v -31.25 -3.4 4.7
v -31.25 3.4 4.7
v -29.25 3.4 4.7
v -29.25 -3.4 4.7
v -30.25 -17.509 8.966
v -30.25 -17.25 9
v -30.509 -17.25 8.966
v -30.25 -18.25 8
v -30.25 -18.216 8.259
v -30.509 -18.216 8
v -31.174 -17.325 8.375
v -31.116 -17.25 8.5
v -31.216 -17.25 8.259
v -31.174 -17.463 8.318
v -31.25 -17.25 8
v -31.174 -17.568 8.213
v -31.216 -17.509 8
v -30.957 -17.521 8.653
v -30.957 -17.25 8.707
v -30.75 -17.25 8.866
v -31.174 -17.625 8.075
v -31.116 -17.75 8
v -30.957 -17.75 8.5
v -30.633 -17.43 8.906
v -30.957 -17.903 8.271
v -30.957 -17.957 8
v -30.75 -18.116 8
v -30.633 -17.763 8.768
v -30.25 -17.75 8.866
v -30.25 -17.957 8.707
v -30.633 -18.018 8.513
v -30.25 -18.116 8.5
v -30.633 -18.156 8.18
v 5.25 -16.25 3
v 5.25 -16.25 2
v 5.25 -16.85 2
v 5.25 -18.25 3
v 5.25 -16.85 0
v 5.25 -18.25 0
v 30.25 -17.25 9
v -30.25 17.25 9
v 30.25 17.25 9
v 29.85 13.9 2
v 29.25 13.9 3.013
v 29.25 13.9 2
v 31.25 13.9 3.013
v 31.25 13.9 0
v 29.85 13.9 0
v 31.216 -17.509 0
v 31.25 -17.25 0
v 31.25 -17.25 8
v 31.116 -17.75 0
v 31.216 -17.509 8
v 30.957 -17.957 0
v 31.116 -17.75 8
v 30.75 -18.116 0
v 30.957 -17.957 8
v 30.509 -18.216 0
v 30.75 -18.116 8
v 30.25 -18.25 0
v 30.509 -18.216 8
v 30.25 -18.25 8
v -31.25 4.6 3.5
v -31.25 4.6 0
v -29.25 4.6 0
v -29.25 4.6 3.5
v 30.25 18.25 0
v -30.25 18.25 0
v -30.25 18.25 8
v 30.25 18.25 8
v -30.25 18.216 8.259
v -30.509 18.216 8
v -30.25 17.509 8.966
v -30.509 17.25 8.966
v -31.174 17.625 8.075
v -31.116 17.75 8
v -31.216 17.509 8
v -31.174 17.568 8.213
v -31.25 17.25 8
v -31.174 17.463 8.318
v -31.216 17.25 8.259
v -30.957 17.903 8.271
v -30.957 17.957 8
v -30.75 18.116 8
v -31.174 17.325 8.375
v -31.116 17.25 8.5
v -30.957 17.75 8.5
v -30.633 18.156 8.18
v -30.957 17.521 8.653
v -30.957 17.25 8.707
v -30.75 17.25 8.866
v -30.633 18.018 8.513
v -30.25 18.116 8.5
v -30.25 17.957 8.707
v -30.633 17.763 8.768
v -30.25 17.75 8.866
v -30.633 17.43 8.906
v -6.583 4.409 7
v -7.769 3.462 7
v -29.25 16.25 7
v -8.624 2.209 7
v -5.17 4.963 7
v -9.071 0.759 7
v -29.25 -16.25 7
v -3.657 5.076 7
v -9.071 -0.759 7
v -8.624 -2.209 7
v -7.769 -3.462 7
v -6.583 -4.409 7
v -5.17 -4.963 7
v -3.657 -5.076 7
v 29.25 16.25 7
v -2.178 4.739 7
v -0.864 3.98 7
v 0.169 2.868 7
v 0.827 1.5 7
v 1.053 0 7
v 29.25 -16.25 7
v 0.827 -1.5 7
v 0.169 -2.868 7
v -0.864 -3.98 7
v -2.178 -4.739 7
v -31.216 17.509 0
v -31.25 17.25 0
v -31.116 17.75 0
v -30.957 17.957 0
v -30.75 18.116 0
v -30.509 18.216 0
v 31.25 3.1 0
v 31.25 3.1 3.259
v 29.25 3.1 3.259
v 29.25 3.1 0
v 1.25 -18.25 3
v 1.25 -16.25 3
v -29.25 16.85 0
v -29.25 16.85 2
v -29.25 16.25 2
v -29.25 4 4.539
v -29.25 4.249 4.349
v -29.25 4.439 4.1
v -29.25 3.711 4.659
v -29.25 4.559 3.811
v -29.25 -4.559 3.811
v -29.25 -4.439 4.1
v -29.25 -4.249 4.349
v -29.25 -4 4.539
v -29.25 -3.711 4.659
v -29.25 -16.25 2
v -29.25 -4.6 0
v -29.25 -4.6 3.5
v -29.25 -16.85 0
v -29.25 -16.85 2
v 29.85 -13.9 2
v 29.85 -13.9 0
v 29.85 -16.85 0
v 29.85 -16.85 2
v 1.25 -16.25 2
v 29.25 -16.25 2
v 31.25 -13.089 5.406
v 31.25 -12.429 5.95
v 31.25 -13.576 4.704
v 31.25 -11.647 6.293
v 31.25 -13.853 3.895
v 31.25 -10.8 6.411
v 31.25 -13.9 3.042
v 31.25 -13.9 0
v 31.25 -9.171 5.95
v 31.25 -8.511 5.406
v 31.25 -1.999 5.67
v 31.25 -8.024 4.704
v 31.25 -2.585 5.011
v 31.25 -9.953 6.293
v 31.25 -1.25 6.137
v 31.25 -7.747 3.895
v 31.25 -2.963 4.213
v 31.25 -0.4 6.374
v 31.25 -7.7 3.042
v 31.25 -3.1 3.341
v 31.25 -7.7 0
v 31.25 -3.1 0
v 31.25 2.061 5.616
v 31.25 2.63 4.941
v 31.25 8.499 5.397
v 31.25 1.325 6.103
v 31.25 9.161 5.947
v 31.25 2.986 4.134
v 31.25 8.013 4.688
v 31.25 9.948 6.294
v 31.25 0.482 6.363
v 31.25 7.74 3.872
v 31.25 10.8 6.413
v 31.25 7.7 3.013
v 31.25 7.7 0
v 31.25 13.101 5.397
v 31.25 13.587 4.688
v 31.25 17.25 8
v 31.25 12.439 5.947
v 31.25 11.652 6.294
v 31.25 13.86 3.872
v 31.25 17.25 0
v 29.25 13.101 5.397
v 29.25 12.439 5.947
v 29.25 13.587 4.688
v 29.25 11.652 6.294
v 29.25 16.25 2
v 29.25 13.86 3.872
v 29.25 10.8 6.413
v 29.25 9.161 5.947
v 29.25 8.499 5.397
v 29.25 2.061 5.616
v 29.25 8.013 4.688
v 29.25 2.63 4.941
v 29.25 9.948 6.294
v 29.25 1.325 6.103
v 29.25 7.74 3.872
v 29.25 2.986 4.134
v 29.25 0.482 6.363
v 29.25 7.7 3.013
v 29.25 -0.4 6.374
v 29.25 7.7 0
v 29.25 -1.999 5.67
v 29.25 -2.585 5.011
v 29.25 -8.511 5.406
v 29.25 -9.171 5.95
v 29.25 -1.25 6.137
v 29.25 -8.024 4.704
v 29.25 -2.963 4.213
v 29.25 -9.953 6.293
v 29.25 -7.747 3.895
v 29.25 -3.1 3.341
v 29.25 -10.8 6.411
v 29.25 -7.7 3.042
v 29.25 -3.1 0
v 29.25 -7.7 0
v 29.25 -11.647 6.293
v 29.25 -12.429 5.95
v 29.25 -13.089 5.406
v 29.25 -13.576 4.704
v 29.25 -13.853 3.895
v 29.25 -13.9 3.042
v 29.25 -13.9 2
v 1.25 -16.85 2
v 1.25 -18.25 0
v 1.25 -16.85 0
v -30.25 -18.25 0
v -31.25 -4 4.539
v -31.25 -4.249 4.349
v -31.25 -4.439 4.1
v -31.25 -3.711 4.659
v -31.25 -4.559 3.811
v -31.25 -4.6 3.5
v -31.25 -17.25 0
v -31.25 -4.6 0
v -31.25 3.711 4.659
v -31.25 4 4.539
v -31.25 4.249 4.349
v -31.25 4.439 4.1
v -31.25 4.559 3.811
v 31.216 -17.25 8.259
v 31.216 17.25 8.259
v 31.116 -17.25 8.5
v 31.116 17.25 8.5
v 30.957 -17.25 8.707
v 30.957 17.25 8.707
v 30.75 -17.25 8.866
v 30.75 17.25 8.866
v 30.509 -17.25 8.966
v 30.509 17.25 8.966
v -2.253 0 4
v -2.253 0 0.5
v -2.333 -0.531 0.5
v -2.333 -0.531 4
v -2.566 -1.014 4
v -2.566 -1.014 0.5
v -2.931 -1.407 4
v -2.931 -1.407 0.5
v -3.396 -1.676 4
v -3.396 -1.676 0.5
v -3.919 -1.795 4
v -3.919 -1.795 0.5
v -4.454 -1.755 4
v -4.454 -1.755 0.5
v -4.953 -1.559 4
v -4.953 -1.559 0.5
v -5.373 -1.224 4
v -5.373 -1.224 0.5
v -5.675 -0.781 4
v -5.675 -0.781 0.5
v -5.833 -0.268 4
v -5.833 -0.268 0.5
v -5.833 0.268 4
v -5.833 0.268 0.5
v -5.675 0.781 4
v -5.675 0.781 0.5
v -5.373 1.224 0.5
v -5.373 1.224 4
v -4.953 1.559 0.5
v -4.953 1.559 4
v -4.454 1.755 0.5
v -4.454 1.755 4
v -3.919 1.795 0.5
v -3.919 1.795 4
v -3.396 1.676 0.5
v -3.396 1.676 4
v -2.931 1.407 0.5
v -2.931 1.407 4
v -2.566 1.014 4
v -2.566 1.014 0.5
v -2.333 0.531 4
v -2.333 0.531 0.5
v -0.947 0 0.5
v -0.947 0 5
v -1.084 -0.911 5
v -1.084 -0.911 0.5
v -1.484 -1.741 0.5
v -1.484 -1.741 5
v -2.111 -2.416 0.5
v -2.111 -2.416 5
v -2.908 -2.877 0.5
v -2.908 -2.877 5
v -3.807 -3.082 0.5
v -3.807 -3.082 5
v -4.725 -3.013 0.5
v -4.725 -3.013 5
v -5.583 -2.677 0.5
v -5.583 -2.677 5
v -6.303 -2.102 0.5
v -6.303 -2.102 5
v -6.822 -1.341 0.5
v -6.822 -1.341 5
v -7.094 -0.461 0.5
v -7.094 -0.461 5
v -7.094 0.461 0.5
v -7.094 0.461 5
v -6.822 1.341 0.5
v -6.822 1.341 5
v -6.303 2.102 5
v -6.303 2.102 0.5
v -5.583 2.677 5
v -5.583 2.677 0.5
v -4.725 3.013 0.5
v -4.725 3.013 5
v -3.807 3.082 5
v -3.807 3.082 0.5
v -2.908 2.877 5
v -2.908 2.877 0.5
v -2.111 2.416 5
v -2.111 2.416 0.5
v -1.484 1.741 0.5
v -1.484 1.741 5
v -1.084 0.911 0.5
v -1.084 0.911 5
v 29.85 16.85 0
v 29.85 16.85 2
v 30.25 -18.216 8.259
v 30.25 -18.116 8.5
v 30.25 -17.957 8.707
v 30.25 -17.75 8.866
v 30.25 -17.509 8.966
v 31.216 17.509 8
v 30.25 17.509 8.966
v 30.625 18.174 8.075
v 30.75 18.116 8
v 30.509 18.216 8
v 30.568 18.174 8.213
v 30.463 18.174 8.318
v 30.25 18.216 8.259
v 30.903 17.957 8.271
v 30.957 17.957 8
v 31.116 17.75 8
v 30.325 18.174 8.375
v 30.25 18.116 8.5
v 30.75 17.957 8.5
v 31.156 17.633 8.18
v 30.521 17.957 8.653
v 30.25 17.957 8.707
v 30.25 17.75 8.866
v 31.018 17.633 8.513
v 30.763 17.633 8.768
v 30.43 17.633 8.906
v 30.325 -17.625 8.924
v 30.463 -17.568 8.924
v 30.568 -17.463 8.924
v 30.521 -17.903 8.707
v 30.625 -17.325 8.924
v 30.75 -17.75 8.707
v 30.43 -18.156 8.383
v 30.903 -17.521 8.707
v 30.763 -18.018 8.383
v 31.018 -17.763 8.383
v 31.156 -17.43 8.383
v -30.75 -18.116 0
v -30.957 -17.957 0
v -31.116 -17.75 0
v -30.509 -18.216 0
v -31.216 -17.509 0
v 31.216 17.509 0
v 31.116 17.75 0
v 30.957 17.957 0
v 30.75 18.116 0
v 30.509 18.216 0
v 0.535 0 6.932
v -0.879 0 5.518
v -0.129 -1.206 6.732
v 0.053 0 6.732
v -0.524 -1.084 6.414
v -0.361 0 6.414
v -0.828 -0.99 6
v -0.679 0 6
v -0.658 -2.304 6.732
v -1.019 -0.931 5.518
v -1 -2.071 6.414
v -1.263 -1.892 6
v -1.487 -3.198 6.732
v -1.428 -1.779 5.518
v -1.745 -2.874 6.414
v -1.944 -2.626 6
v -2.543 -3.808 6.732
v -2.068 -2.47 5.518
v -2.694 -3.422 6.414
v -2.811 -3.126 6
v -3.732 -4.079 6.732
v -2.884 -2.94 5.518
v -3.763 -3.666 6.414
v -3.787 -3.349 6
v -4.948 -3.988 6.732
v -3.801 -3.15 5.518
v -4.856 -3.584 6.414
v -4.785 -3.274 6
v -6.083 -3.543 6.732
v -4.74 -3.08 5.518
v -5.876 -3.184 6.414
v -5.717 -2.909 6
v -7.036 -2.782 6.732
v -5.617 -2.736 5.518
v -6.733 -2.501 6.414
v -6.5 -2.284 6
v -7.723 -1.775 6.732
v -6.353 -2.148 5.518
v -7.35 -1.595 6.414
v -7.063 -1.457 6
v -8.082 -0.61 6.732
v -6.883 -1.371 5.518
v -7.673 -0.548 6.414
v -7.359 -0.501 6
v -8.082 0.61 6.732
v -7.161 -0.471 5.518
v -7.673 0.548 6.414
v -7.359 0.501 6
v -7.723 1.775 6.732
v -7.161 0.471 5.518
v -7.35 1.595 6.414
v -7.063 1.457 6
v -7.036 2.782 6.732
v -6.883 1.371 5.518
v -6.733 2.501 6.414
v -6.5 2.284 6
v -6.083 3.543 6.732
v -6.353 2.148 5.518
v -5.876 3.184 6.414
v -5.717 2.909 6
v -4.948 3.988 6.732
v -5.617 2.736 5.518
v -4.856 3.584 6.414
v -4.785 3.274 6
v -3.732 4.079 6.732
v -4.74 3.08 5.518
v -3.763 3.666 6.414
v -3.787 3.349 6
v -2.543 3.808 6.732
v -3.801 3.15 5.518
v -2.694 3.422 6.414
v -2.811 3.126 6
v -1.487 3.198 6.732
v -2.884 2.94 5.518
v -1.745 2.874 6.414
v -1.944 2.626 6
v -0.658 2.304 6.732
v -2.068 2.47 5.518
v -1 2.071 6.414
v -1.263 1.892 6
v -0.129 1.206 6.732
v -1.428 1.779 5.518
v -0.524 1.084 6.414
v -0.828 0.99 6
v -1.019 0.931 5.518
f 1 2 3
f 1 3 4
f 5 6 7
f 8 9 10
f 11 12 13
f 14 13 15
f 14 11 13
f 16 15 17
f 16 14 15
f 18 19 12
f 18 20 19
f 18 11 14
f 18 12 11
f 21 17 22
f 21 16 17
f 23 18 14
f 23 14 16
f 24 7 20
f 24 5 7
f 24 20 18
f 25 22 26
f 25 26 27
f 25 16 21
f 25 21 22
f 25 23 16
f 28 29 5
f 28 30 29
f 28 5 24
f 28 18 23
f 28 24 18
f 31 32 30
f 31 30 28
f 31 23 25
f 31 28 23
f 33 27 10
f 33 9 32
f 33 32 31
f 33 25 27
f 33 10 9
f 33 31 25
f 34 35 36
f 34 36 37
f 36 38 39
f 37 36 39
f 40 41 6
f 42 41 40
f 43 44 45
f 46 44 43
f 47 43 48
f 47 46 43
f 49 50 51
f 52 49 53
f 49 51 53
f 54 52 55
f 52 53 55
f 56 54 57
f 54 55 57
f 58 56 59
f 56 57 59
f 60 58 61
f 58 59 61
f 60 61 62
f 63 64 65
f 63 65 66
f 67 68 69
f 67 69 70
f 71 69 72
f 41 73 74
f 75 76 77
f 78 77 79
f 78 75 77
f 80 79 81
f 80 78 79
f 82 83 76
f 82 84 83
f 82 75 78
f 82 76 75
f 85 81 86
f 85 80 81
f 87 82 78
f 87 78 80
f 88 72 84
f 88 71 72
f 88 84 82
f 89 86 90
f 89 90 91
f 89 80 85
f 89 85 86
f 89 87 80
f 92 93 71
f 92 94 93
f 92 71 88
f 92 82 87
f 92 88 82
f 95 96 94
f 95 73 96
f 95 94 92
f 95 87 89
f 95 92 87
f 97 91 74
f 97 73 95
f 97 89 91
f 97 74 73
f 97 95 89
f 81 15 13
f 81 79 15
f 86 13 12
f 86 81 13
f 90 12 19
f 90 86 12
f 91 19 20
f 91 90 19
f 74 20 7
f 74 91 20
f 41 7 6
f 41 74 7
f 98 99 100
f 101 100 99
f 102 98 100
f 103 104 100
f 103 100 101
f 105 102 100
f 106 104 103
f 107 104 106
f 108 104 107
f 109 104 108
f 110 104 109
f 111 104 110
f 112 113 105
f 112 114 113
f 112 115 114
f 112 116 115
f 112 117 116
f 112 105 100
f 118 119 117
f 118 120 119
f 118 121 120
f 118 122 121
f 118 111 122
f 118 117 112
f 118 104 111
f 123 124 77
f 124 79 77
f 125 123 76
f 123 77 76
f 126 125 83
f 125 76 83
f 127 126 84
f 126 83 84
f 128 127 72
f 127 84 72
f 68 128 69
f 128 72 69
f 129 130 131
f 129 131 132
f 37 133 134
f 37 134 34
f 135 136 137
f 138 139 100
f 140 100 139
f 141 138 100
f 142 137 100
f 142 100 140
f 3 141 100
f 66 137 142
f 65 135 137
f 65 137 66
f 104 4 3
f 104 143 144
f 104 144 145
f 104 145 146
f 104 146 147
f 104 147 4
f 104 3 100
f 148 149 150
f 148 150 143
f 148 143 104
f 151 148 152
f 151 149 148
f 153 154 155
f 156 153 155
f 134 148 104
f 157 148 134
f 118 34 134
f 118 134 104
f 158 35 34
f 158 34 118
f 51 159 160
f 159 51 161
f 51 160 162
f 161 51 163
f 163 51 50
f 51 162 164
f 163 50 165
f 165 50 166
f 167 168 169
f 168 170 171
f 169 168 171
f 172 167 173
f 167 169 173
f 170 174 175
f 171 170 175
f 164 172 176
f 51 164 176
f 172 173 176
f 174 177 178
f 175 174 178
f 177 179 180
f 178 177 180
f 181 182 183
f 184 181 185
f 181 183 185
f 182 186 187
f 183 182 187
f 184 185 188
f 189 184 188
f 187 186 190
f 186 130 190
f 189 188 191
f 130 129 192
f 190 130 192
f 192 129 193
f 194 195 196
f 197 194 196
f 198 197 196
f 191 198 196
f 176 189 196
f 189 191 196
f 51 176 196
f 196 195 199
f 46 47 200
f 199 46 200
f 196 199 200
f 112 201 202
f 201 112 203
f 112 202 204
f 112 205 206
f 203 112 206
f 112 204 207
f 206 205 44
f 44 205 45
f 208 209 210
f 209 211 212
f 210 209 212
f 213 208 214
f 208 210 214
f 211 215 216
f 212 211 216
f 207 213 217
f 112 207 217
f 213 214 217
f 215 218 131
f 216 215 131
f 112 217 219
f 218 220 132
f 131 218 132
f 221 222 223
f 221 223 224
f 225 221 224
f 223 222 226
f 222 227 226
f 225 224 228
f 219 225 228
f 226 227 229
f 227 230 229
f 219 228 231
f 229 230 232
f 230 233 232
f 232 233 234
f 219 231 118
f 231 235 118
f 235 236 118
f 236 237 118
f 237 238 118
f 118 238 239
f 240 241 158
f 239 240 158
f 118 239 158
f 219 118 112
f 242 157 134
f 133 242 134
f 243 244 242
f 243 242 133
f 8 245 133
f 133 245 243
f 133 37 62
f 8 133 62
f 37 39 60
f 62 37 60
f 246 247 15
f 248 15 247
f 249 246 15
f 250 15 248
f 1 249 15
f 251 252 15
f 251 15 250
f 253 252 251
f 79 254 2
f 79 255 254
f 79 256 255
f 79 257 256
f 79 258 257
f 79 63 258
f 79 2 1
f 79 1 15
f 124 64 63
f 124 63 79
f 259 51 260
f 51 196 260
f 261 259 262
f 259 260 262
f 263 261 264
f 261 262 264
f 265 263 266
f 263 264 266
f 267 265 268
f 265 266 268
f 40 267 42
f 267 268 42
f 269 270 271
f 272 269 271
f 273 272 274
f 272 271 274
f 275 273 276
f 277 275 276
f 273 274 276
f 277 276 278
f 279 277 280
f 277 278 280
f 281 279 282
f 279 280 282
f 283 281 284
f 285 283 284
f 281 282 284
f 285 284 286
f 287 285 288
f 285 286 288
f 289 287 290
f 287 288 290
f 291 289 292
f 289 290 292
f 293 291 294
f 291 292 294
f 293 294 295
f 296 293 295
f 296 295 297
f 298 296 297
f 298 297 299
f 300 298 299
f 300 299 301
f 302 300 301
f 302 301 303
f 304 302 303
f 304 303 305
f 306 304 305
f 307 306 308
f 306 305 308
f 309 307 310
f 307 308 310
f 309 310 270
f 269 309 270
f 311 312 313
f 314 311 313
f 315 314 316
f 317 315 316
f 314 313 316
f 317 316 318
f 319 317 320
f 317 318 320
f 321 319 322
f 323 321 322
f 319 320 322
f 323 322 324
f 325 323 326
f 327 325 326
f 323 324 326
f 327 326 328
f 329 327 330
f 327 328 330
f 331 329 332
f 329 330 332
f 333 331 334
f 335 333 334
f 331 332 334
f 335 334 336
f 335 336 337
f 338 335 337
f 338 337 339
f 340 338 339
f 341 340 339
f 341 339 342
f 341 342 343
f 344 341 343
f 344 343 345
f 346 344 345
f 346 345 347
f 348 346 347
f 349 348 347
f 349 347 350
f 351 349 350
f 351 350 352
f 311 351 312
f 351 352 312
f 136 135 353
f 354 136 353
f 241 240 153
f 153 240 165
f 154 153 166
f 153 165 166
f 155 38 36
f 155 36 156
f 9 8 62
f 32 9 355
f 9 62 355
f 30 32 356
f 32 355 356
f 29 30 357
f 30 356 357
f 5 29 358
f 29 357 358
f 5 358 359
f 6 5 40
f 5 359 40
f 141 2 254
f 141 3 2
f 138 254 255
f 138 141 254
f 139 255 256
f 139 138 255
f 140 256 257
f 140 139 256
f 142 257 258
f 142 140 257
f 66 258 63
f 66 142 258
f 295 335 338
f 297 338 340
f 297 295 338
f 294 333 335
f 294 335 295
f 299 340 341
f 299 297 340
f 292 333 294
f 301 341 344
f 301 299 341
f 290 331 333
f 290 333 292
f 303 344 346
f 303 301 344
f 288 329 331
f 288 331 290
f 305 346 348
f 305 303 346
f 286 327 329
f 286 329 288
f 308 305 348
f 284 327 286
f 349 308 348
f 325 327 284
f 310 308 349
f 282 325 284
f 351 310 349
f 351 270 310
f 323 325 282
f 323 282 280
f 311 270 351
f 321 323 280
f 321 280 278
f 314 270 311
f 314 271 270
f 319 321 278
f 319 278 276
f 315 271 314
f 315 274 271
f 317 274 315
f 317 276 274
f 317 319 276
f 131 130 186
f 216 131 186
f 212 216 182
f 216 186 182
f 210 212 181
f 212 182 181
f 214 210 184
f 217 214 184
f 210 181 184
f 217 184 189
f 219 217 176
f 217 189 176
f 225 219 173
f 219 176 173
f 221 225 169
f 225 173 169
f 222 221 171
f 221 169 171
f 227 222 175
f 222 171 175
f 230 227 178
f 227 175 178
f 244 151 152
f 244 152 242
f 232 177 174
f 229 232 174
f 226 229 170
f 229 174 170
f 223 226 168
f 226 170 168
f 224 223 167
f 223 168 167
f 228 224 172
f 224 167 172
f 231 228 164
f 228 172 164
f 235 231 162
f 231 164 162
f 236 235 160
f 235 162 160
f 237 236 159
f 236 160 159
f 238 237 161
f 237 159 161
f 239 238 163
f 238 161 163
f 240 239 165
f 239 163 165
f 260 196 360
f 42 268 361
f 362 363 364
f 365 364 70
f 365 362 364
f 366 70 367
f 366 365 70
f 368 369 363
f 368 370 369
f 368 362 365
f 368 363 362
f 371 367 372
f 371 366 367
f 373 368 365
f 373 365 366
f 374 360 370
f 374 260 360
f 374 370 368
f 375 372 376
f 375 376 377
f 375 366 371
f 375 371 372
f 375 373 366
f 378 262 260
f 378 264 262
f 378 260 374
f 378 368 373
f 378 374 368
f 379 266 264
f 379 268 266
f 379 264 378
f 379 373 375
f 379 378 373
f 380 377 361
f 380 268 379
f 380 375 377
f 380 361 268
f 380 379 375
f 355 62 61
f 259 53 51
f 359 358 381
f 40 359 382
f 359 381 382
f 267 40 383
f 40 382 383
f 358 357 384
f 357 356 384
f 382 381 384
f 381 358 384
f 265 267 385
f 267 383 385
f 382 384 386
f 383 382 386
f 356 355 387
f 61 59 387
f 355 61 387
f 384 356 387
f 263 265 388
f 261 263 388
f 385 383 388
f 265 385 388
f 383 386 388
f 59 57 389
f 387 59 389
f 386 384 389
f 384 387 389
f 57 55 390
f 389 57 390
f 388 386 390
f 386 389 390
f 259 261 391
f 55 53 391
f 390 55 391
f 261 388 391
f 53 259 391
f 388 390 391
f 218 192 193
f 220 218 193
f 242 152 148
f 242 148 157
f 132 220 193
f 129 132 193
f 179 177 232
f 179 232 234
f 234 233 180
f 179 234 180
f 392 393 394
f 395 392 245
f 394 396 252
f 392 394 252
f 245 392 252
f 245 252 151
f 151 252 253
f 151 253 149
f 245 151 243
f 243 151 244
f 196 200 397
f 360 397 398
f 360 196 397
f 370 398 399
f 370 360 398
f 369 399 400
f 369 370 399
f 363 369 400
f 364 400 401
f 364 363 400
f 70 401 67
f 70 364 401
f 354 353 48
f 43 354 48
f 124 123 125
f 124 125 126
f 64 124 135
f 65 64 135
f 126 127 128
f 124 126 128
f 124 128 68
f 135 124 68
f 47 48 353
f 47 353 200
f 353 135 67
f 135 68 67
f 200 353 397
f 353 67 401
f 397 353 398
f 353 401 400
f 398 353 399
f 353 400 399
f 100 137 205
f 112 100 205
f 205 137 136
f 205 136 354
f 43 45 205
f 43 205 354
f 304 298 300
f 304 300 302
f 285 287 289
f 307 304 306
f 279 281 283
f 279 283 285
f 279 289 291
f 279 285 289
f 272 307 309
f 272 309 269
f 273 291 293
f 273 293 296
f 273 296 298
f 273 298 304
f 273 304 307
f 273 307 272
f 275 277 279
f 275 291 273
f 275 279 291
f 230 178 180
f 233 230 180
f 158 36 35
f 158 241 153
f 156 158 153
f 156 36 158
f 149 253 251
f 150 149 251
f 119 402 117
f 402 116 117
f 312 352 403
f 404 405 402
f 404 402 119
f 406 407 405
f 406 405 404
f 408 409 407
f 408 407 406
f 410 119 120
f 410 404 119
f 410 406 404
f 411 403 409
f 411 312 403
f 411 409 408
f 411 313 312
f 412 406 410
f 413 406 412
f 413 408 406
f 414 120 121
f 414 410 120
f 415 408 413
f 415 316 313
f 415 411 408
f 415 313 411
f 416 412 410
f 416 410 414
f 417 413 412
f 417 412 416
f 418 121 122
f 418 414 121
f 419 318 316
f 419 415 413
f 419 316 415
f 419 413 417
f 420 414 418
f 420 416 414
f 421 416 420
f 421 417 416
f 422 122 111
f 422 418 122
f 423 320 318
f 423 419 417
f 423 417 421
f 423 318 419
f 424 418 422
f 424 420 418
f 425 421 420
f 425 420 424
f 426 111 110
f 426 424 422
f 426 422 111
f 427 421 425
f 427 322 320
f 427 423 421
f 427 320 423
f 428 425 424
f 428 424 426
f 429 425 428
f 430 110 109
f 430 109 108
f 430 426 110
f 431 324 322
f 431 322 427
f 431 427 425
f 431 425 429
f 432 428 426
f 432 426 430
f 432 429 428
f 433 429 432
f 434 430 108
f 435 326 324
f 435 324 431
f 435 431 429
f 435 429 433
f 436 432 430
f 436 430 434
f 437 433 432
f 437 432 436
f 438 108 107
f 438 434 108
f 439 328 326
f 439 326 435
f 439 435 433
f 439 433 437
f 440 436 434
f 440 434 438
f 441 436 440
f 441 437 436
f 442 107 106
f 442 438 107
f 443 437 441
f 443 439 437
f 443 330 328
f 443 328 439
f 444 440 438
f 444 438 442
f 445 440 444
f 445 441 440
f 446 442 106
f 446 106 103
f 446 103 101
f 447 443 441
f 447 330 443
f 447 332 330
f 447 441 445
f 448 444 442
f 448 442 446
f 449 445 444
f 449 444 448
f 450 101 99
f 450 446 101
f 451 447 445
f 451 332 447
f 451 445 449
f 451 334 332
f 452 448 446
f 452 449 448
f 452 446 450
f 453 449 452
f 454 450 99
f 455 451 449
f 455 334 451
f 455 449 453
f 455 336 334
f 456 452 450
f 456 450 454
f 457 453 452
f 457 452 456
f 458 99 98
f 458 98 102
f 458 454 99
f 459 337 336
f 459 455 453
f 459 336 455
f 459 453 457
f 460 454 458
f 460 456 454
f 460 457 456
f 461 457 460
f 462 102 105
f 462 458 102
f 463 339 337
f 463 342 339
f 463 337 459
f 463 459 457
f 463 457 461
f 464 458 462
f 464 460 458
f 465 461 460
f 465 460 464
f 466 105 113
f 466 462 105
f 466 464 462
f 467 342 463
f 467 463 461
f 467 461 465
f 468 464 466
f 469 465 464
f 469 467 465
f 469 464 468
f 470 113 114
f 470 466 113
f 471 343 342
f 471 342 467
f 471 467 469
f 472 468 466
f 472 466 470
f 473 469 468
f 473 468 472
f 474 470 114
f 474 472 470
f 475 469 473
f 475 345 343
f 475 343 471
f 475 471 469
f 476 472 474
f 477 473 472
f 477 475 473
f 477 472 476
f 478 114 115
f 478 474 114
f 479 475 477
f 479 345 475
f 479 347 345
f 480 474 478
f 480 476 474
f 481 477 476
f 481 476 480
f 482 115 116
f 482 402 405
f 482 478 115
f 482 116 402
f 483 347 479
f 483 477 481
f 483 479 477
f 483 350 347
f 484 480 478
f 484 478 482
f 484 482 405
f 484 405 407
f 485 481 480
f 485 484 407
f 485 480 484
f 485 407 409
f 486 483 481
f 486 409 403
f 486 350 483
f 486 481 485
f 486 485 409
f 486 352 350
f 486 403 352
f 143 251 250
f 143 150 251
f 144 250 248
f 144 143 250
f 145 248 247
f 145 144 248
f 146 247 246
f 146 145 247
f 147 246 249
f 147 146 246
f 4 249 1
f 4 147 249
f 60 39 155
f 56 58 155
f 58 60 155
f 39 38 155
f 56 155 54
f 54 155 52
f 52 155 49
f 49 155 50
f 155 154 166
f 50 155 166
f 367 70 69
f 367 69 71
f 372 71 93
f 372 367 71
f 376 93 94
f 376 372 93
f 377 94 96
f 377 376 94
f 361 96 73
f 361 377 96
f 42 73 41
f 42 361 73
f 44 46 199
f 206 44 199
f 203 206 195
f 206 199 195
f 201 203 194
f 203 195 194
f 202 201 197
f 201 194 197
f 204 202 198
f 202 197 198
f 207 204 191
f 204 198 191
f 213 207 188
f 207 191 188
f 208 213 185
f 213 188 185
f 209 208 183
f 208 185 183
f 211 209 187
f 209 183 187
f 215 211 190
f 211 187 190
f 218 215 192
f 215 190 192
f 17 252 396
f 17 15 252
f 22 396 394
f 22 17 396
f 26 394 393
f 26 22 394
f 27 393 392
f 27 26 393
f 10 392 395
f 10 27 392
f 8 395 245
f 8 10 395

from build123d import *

# Parameters (mm, degrees)
SKETCH_W        = 62.5
SKETCH_H        = 36.5
PAD_DEPTH       = 9
SKETCH001_W     = 58.5
SKETCH001_H     = 32.5
POCKET_DEPTH    = 7
SKETCH002_R     = 3.09059
PAD001_DEPTH    = 6.5
SKETCH003_R     = 1.8
POCKET001_DEPTH = 3.5
SKETCH004_W     = 4
SKETCH004_H     = 2.125
POCKET002_DEPTH = 3
SKETCH005_W     = 9.2
SKETCH005_H     = 4.7
POCKET003_DEPTH = 5
FILLET_R        = 1.2
FILLET001_R     = 1.2
POCKET004_DEPTH = 5
SKETCH007_W     = 30.5
SKETCH007_H     = 0.6
POCKET005_DEPTH = 2
SKETCH008_W     = 58.5
SKETCH008_H     = 0.6
POCKET006_DEPTH = 2
SKETCH009_W     = 24
SKETCH009_H     = 0.6
POCKET007_DEPTH = 2
SKETCH010_W     = 0.6
SKETCH010_H     = 3
POCKET008_DEPTH = 2
SKETCH011_W     = 0.6
SKETCH011_H     = 3
POCKET009_DEPTH = 2
FILLET002_R     = 2
FILLET003_R     = 1


with BuildPart() as part:
    # Sketch → Pad (new body)
    with BuildSketch(Plane.XY):
        Rectangle(SKETCH_W, SKETCH_H)
    extrude(amount=PAD_DEPTH)

    # Sketch001 (on Face5 of Pad) → Pocket (cut)
    with BuildSketch(Plane(origin=(0, 0, 0), x_dir=(1, 0, 0), z_dir=(0, 0, -1))):
        Rectangle(SKETCH001_W, SKETCH001_H)
    extrude(amount=-POCKET_DEPTH, mode=Mode.SUBTRACT)

    # Sketch002 (on Face11 of Pocket) → Pad001 (join)
    with BuildSketch(Plane(origin=(0, 0, 7), x_dir=(1, 0, 0), z_dir=(0, 0, -1))):
        with Locations((-4.037531, 0)):
            Circle(SKETCH002_R)
    extrude(amount=PAD001_DEPTH)

    # Sketch003 (on Face13 of Pad001) → Pocket001 (cut)
    with BuildSketch(Plane(origin=(0, 0, 0.5), x_dir=(1, 0, 0), z_dir=(0, 0, -1))):
        with Locations((-4.053153, 0)):
            Circle(SKETCH003_R)
    extrude(amount=-POCKET001_DEPTH, mode=Mode.SUBTRACT)

    # Sketch004 (on Face4 of Pocket001) → Pocket002 (cut)
    with BuildSketch(Plane(origin=(0, 0, 0), x_dir=(1, 0, 0), z_dir=(0, 0, -1))):
        with Locations((3.25, 17.240923)):
            Rectangle(SKETCH004_W, SKETCH004_H)
    extrude(amount=-POCKET002_DEPTH, mode=Mode.SUBTRACT)

    # Sketch005 (on Face1 of Pocket002) → Pocket003 (cut)
    with BuildSketch(Plane(origin=(-31.25, 0, 0), x_dir=(0, -1, 0), z_dir=(-1, 0, 0))):
        with Locations((0, 2.35)):
            Rectangle(SKETCH005_W, SKETCH005_H)
    extrude(amount=-POCKET003_DEPTH, mode=Mode.SUBTRACT)

    # Fillet
    fillet_edges = [part.edges().sort_by_distance(p)[0] for p in [
        (-30.25, -4.6, 4.7),
    ]]
    fillet(fillet_edges, radius=FILLET_R)

    # Fillet001
    fillet001_edges = [part.edges().sort_by_distance(p)[0] for p in [
        (-30.25, 4.6, 4.7),
    ]]
    fillet(fillet001_edges, radius=FILLET001_R)

    # Sketch006 (on Face13 of Fillet001) → Pocket004 (cut)
    with BuildSketch(Plane.YZ.offset(31.25)):
        with BuildLine():
            ThreePointArc((3.1, 3.258545), (0.041455, 6.4), (-3.1, 3.341455))
            Line((-3.1, 3.341455), (-3.1, 0))
            Line((-3.1, 0), (3.1, 0))
            Line((3.1, 3.258545), (3.1, 0))
        make_face()
        with BuildLine():
            ThreePointArc((-7.7, 3.041637), (-10.800001, 6.410748), (-13.9, 3.041636))
            Line((-13.9, 3.041636), (-13.9, 0))
            Line((-7.7, 0), (-13.9, 0))
            Line((-7.7, 3.041637), (-7.7, 0))
        make_face()
        with BuildLine():
            ThreePointArc((13.9, 3.012545), (10.799999, 6.413299), (7.7, 3.012544))
            Line((7.7, 3.012544), (7.7, 0))
            Line((13.9, 0), (7.7, 0))
            Line((13.9, 3.012545), (13.9, 0))
        make_face()
    extrude(amount=-POCKET004_DEPTH, mode=Mode.SUBTRACT)

    # Sketch007 (on Face8 of Pocket004) → Pocket005 (cut)
    with BuildSketch(Plane(origin=(0, 0, 0), x_dir=(1, 0, 0), z_dir=(0, 0, -1))):
        with Locations((-14, 16.55)):
            Rectangle(SKETCH007_W, SKETCH007_H)
    extrude(amount=-POCKET005_DEPTH, mode=Mode.SUBTRACT)

    # Sketch008 (on Face7 of Pocket004) → Pocket006 (cut)
    with BuildSketch(Plane(origin=(0, 0, 0), x_dir=(1, 0, 0), z_dir=(0, 0, -1))):
        with Locations((0, -16.55)):
            Rectangle(SKETCH008_W, SKETCH008_H)
    extrude(amount=-POCKET006_DEPTH, mode=Mode.SUBTRACT)

    # Sketch009 (on Face19 of Pocket004) → Pocket007 (cut)
    with BuildSketch(Plane(origin=(0, 0, 0), x_dir=(1, 0, 0), z_dir=(0, 0, -1))):
        with Locations((17.25, 16.55)):
            Rectangle(SKETCH009_W, SKETCH009_H)
    extrude(amount=-POCKET007_DEPTH, mode=Mode.SUBTRACT)

    # Sketch010 (on Face22 of Pocket007) → Pocket008 (cut)
    with BuildSketch(Plane(origin=(0, 0, 0), x_dir=(1, 0, 0), z_dir=(0, 0, -1))):
        with Locations((29.55, 15.35)):
            Rectangle(SKETCH010_W, SKETCH010_H)
    extrude(amount=-POCKET008_DEPTH, mode=Mode.SUBTRACT)

    # Sketch011 (on Face7 of Pocket008) → Pocket009 (cut)
    with BuildSketch(Plane(origin=(0, 0, 0), x_dir=(1, 0, 0), z_dir=(0, 0, -1))):
        with Locations((29.55, -15.35)):
            Rectangle(SKETCH011_W, SKETCH011_H)
    extrude(amount=-POCKET009_DEPTH, mode=Mode.SUBTRACT)

    # Fillet002
    fillet002_edges = [part.edges().sort_by_distance(p)[0] for p in [
        (-7.128121, 0, 7),
    ]]
    fillet(fillet002_edges, radius=FILLET002_R)

    # Fillet003
    fillet003_edges = [part.edges().sort_by_distance(p)[0] for p in [
        (31.25, -18.25, 4.5),
        (0, -18.25, 9),
        (31.25, 0, 9),
        (31.25, 18.25, 4.5),
        (0, 18.25, 9),
        (-31.25, 18.25, 4.5),
        (-31.25, 0, 9),
        (-31.25, -18.25, 4.5),
    ]]
    fillet(fillet003_edges, radius=FILLET003_R)


solid = part.part
